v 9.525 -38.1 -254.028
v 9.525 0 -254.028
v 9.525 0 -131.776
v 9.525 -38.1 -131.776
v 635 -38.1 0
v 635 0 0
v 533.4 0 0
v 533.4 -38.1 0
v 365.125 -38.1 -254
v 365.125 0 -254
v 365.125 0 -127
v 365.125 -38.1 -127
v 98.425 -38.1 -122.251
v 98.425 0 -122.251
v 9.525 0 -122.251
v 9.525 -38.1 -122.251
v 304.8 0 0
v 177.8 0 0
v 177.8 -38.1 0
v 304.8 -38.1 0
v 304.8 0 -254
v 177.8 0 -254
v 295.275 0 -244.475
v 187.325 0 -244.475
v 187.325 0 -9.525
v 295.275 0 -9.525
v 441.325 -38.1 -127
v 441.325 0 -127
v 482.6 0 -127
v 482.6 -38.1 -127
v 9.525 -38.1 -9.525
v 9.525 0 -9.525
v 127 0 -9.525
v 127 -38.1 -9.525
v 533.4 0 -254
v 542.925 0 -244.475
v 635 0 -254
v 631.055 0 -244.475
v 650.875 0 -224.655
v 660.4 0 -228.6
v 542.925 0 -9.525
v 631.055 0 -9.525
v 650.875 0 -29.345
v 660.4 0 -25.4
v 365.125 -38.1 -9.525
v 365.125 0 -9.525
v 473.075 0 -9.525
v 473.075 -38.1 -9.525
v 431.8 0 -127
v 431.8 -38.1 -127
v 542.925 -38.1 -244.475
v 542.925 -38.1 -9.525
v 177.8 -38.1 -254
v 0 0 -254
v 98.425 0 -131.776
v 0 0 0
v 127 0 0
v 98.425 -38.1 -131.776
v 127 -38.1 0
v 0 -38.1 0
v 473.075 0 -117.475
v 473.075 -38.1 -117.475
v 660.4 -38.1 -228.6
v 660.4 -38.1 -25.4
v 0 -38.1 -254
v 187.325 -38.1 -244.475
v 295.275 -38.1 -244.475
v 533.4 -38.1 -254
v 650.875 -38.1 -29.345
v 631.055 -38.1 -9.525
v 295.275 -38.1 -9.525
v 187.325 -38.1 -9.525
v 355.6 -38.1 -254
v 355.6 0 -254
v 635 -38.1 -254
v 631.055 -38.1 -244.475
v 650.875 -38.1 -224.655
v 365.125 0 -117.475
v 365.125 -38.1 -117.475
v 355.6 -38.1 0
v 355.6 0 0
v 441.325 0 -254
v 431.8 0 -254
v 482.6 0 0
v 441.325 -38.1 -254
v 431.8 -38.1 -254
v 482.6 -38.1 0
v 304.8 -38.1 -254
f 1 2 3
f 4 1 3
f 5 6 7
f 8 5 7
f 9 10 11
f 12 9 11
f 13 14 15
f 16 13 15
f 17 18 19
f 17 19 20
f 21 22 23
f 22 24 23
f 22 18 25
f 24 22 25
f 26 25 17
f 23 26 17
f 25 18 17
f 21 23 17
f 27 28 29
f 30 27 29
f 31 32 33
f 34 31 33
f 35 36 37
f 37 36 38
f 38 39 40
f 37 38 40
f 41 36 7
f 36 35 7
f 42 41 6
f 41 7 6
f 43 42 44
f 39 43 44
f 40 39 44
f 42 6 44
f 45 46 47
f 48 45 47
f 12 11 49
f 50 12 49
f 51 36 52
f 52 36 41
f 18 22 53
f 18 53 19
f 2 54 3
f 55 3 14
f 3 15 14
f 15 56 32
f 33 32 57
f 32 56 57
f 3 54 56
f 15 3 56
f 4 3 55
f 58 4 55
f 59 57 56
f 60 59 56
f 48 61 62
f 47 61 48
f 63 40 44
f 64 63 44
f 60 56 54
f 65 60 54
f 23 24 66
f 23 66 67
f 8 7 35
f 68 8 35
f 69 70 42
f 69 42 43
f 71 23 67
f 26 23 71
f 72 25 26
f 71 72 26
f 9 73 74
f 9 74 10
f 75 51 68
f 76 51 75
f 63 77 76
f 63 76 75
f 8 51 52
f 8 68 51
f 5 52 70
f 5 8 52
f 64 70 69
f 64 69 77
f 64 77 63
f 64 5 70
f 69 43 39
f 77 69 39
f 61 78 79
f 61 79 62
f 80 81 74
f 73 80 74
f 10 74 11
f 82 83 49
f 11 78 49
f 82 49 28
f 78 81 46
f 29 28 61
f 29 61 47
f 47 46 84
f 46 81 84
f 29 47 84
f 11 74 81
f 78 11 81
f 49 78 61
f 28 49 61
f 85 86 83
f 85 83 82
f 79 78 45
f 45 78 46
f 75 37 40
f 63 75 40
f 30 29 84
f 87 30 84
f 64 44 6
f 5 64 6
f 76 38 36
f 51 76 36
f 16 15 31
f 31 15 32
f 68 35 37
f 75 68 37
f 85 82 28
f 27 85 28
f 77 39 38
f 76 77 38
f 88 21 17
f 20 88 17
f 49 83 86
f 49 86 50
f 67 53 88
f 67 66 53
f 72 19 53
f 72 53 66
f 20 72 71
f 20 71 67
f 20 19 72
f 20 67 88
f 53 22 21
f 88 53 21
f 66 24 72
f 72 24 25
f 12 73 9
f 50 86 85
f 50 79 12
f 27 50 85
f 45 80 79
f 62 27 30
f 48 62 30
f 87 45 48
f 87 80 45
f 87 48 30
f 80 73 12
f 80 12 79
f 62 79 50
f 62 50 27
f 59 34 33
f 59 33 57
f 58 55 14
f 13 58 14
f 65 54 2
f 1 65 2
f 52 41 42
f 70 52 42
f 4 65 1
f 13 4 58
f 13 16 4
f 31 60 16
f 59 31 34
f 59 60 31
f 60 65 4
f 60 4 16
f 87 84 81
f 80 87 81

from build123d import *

# Parameters (mm, degrees)
F0_W     = 127
F0_H     = 254
F0_W_2   = 107.95
F0_H_2   = 234.95
F0_W_3   = 9.525
F0_H_3   = 127
F0_H_4   = 107.95
F1_DEPTH = 38.1


with BuildPart() as f1:
    # F0 (on Front) → F1 (new body)
    with BuildSketch(Plane.XZ):
        Polygon((127, 0), (0, 0), (0, -254), (9.525, -254.027693), (9.525, -131.776347), (98.425, -131.776347), (98.425, -122.251347), (9.525, -122.251347), (9.525, -9.525), (127, -9.525), align=None)
        with Locations((241.3, -127)):
            Rectangle(F0_W, F0_H)
        with Locations((241.3, -127)):
            Rectangle(F0_W_2, F0_H_2, mode=Mode.SUBTRACT)
        with Locations((360.3625, -190.5)):
            Rectangle(F0_W_3, F0_H_3)
        Polygon((355.6, 0), (355.6, -127), (365.125, -127), (431.8, -127), (441.325, -127), (482.6, -127), (482.6, 0), align=None)
        with Locations((419.1, -63.5)):
            Rectangle(F0_W_2, F0_H_4, mode=Mode.SUBTRACT)
        with Locations((436.5625, -190.5)):
            Rectangle(F0_W_3, F0_H_3)
        Polygon((635, 0), (533.4, 0), (533.4, -254), (635, -254), (660.4, -228.6), (660.4, -25.4), align=None)
        Polygon((631.054616, -9.525), (650.875, -29.345384), (650.875, -224.654616), (631.054616, -244.475), (542.925, -244.475), (542.925, -9.525), align=None, mode=Mode.SUBTRACT)
    extrude(amount=F1_DEPTH)


solid = f1.part
